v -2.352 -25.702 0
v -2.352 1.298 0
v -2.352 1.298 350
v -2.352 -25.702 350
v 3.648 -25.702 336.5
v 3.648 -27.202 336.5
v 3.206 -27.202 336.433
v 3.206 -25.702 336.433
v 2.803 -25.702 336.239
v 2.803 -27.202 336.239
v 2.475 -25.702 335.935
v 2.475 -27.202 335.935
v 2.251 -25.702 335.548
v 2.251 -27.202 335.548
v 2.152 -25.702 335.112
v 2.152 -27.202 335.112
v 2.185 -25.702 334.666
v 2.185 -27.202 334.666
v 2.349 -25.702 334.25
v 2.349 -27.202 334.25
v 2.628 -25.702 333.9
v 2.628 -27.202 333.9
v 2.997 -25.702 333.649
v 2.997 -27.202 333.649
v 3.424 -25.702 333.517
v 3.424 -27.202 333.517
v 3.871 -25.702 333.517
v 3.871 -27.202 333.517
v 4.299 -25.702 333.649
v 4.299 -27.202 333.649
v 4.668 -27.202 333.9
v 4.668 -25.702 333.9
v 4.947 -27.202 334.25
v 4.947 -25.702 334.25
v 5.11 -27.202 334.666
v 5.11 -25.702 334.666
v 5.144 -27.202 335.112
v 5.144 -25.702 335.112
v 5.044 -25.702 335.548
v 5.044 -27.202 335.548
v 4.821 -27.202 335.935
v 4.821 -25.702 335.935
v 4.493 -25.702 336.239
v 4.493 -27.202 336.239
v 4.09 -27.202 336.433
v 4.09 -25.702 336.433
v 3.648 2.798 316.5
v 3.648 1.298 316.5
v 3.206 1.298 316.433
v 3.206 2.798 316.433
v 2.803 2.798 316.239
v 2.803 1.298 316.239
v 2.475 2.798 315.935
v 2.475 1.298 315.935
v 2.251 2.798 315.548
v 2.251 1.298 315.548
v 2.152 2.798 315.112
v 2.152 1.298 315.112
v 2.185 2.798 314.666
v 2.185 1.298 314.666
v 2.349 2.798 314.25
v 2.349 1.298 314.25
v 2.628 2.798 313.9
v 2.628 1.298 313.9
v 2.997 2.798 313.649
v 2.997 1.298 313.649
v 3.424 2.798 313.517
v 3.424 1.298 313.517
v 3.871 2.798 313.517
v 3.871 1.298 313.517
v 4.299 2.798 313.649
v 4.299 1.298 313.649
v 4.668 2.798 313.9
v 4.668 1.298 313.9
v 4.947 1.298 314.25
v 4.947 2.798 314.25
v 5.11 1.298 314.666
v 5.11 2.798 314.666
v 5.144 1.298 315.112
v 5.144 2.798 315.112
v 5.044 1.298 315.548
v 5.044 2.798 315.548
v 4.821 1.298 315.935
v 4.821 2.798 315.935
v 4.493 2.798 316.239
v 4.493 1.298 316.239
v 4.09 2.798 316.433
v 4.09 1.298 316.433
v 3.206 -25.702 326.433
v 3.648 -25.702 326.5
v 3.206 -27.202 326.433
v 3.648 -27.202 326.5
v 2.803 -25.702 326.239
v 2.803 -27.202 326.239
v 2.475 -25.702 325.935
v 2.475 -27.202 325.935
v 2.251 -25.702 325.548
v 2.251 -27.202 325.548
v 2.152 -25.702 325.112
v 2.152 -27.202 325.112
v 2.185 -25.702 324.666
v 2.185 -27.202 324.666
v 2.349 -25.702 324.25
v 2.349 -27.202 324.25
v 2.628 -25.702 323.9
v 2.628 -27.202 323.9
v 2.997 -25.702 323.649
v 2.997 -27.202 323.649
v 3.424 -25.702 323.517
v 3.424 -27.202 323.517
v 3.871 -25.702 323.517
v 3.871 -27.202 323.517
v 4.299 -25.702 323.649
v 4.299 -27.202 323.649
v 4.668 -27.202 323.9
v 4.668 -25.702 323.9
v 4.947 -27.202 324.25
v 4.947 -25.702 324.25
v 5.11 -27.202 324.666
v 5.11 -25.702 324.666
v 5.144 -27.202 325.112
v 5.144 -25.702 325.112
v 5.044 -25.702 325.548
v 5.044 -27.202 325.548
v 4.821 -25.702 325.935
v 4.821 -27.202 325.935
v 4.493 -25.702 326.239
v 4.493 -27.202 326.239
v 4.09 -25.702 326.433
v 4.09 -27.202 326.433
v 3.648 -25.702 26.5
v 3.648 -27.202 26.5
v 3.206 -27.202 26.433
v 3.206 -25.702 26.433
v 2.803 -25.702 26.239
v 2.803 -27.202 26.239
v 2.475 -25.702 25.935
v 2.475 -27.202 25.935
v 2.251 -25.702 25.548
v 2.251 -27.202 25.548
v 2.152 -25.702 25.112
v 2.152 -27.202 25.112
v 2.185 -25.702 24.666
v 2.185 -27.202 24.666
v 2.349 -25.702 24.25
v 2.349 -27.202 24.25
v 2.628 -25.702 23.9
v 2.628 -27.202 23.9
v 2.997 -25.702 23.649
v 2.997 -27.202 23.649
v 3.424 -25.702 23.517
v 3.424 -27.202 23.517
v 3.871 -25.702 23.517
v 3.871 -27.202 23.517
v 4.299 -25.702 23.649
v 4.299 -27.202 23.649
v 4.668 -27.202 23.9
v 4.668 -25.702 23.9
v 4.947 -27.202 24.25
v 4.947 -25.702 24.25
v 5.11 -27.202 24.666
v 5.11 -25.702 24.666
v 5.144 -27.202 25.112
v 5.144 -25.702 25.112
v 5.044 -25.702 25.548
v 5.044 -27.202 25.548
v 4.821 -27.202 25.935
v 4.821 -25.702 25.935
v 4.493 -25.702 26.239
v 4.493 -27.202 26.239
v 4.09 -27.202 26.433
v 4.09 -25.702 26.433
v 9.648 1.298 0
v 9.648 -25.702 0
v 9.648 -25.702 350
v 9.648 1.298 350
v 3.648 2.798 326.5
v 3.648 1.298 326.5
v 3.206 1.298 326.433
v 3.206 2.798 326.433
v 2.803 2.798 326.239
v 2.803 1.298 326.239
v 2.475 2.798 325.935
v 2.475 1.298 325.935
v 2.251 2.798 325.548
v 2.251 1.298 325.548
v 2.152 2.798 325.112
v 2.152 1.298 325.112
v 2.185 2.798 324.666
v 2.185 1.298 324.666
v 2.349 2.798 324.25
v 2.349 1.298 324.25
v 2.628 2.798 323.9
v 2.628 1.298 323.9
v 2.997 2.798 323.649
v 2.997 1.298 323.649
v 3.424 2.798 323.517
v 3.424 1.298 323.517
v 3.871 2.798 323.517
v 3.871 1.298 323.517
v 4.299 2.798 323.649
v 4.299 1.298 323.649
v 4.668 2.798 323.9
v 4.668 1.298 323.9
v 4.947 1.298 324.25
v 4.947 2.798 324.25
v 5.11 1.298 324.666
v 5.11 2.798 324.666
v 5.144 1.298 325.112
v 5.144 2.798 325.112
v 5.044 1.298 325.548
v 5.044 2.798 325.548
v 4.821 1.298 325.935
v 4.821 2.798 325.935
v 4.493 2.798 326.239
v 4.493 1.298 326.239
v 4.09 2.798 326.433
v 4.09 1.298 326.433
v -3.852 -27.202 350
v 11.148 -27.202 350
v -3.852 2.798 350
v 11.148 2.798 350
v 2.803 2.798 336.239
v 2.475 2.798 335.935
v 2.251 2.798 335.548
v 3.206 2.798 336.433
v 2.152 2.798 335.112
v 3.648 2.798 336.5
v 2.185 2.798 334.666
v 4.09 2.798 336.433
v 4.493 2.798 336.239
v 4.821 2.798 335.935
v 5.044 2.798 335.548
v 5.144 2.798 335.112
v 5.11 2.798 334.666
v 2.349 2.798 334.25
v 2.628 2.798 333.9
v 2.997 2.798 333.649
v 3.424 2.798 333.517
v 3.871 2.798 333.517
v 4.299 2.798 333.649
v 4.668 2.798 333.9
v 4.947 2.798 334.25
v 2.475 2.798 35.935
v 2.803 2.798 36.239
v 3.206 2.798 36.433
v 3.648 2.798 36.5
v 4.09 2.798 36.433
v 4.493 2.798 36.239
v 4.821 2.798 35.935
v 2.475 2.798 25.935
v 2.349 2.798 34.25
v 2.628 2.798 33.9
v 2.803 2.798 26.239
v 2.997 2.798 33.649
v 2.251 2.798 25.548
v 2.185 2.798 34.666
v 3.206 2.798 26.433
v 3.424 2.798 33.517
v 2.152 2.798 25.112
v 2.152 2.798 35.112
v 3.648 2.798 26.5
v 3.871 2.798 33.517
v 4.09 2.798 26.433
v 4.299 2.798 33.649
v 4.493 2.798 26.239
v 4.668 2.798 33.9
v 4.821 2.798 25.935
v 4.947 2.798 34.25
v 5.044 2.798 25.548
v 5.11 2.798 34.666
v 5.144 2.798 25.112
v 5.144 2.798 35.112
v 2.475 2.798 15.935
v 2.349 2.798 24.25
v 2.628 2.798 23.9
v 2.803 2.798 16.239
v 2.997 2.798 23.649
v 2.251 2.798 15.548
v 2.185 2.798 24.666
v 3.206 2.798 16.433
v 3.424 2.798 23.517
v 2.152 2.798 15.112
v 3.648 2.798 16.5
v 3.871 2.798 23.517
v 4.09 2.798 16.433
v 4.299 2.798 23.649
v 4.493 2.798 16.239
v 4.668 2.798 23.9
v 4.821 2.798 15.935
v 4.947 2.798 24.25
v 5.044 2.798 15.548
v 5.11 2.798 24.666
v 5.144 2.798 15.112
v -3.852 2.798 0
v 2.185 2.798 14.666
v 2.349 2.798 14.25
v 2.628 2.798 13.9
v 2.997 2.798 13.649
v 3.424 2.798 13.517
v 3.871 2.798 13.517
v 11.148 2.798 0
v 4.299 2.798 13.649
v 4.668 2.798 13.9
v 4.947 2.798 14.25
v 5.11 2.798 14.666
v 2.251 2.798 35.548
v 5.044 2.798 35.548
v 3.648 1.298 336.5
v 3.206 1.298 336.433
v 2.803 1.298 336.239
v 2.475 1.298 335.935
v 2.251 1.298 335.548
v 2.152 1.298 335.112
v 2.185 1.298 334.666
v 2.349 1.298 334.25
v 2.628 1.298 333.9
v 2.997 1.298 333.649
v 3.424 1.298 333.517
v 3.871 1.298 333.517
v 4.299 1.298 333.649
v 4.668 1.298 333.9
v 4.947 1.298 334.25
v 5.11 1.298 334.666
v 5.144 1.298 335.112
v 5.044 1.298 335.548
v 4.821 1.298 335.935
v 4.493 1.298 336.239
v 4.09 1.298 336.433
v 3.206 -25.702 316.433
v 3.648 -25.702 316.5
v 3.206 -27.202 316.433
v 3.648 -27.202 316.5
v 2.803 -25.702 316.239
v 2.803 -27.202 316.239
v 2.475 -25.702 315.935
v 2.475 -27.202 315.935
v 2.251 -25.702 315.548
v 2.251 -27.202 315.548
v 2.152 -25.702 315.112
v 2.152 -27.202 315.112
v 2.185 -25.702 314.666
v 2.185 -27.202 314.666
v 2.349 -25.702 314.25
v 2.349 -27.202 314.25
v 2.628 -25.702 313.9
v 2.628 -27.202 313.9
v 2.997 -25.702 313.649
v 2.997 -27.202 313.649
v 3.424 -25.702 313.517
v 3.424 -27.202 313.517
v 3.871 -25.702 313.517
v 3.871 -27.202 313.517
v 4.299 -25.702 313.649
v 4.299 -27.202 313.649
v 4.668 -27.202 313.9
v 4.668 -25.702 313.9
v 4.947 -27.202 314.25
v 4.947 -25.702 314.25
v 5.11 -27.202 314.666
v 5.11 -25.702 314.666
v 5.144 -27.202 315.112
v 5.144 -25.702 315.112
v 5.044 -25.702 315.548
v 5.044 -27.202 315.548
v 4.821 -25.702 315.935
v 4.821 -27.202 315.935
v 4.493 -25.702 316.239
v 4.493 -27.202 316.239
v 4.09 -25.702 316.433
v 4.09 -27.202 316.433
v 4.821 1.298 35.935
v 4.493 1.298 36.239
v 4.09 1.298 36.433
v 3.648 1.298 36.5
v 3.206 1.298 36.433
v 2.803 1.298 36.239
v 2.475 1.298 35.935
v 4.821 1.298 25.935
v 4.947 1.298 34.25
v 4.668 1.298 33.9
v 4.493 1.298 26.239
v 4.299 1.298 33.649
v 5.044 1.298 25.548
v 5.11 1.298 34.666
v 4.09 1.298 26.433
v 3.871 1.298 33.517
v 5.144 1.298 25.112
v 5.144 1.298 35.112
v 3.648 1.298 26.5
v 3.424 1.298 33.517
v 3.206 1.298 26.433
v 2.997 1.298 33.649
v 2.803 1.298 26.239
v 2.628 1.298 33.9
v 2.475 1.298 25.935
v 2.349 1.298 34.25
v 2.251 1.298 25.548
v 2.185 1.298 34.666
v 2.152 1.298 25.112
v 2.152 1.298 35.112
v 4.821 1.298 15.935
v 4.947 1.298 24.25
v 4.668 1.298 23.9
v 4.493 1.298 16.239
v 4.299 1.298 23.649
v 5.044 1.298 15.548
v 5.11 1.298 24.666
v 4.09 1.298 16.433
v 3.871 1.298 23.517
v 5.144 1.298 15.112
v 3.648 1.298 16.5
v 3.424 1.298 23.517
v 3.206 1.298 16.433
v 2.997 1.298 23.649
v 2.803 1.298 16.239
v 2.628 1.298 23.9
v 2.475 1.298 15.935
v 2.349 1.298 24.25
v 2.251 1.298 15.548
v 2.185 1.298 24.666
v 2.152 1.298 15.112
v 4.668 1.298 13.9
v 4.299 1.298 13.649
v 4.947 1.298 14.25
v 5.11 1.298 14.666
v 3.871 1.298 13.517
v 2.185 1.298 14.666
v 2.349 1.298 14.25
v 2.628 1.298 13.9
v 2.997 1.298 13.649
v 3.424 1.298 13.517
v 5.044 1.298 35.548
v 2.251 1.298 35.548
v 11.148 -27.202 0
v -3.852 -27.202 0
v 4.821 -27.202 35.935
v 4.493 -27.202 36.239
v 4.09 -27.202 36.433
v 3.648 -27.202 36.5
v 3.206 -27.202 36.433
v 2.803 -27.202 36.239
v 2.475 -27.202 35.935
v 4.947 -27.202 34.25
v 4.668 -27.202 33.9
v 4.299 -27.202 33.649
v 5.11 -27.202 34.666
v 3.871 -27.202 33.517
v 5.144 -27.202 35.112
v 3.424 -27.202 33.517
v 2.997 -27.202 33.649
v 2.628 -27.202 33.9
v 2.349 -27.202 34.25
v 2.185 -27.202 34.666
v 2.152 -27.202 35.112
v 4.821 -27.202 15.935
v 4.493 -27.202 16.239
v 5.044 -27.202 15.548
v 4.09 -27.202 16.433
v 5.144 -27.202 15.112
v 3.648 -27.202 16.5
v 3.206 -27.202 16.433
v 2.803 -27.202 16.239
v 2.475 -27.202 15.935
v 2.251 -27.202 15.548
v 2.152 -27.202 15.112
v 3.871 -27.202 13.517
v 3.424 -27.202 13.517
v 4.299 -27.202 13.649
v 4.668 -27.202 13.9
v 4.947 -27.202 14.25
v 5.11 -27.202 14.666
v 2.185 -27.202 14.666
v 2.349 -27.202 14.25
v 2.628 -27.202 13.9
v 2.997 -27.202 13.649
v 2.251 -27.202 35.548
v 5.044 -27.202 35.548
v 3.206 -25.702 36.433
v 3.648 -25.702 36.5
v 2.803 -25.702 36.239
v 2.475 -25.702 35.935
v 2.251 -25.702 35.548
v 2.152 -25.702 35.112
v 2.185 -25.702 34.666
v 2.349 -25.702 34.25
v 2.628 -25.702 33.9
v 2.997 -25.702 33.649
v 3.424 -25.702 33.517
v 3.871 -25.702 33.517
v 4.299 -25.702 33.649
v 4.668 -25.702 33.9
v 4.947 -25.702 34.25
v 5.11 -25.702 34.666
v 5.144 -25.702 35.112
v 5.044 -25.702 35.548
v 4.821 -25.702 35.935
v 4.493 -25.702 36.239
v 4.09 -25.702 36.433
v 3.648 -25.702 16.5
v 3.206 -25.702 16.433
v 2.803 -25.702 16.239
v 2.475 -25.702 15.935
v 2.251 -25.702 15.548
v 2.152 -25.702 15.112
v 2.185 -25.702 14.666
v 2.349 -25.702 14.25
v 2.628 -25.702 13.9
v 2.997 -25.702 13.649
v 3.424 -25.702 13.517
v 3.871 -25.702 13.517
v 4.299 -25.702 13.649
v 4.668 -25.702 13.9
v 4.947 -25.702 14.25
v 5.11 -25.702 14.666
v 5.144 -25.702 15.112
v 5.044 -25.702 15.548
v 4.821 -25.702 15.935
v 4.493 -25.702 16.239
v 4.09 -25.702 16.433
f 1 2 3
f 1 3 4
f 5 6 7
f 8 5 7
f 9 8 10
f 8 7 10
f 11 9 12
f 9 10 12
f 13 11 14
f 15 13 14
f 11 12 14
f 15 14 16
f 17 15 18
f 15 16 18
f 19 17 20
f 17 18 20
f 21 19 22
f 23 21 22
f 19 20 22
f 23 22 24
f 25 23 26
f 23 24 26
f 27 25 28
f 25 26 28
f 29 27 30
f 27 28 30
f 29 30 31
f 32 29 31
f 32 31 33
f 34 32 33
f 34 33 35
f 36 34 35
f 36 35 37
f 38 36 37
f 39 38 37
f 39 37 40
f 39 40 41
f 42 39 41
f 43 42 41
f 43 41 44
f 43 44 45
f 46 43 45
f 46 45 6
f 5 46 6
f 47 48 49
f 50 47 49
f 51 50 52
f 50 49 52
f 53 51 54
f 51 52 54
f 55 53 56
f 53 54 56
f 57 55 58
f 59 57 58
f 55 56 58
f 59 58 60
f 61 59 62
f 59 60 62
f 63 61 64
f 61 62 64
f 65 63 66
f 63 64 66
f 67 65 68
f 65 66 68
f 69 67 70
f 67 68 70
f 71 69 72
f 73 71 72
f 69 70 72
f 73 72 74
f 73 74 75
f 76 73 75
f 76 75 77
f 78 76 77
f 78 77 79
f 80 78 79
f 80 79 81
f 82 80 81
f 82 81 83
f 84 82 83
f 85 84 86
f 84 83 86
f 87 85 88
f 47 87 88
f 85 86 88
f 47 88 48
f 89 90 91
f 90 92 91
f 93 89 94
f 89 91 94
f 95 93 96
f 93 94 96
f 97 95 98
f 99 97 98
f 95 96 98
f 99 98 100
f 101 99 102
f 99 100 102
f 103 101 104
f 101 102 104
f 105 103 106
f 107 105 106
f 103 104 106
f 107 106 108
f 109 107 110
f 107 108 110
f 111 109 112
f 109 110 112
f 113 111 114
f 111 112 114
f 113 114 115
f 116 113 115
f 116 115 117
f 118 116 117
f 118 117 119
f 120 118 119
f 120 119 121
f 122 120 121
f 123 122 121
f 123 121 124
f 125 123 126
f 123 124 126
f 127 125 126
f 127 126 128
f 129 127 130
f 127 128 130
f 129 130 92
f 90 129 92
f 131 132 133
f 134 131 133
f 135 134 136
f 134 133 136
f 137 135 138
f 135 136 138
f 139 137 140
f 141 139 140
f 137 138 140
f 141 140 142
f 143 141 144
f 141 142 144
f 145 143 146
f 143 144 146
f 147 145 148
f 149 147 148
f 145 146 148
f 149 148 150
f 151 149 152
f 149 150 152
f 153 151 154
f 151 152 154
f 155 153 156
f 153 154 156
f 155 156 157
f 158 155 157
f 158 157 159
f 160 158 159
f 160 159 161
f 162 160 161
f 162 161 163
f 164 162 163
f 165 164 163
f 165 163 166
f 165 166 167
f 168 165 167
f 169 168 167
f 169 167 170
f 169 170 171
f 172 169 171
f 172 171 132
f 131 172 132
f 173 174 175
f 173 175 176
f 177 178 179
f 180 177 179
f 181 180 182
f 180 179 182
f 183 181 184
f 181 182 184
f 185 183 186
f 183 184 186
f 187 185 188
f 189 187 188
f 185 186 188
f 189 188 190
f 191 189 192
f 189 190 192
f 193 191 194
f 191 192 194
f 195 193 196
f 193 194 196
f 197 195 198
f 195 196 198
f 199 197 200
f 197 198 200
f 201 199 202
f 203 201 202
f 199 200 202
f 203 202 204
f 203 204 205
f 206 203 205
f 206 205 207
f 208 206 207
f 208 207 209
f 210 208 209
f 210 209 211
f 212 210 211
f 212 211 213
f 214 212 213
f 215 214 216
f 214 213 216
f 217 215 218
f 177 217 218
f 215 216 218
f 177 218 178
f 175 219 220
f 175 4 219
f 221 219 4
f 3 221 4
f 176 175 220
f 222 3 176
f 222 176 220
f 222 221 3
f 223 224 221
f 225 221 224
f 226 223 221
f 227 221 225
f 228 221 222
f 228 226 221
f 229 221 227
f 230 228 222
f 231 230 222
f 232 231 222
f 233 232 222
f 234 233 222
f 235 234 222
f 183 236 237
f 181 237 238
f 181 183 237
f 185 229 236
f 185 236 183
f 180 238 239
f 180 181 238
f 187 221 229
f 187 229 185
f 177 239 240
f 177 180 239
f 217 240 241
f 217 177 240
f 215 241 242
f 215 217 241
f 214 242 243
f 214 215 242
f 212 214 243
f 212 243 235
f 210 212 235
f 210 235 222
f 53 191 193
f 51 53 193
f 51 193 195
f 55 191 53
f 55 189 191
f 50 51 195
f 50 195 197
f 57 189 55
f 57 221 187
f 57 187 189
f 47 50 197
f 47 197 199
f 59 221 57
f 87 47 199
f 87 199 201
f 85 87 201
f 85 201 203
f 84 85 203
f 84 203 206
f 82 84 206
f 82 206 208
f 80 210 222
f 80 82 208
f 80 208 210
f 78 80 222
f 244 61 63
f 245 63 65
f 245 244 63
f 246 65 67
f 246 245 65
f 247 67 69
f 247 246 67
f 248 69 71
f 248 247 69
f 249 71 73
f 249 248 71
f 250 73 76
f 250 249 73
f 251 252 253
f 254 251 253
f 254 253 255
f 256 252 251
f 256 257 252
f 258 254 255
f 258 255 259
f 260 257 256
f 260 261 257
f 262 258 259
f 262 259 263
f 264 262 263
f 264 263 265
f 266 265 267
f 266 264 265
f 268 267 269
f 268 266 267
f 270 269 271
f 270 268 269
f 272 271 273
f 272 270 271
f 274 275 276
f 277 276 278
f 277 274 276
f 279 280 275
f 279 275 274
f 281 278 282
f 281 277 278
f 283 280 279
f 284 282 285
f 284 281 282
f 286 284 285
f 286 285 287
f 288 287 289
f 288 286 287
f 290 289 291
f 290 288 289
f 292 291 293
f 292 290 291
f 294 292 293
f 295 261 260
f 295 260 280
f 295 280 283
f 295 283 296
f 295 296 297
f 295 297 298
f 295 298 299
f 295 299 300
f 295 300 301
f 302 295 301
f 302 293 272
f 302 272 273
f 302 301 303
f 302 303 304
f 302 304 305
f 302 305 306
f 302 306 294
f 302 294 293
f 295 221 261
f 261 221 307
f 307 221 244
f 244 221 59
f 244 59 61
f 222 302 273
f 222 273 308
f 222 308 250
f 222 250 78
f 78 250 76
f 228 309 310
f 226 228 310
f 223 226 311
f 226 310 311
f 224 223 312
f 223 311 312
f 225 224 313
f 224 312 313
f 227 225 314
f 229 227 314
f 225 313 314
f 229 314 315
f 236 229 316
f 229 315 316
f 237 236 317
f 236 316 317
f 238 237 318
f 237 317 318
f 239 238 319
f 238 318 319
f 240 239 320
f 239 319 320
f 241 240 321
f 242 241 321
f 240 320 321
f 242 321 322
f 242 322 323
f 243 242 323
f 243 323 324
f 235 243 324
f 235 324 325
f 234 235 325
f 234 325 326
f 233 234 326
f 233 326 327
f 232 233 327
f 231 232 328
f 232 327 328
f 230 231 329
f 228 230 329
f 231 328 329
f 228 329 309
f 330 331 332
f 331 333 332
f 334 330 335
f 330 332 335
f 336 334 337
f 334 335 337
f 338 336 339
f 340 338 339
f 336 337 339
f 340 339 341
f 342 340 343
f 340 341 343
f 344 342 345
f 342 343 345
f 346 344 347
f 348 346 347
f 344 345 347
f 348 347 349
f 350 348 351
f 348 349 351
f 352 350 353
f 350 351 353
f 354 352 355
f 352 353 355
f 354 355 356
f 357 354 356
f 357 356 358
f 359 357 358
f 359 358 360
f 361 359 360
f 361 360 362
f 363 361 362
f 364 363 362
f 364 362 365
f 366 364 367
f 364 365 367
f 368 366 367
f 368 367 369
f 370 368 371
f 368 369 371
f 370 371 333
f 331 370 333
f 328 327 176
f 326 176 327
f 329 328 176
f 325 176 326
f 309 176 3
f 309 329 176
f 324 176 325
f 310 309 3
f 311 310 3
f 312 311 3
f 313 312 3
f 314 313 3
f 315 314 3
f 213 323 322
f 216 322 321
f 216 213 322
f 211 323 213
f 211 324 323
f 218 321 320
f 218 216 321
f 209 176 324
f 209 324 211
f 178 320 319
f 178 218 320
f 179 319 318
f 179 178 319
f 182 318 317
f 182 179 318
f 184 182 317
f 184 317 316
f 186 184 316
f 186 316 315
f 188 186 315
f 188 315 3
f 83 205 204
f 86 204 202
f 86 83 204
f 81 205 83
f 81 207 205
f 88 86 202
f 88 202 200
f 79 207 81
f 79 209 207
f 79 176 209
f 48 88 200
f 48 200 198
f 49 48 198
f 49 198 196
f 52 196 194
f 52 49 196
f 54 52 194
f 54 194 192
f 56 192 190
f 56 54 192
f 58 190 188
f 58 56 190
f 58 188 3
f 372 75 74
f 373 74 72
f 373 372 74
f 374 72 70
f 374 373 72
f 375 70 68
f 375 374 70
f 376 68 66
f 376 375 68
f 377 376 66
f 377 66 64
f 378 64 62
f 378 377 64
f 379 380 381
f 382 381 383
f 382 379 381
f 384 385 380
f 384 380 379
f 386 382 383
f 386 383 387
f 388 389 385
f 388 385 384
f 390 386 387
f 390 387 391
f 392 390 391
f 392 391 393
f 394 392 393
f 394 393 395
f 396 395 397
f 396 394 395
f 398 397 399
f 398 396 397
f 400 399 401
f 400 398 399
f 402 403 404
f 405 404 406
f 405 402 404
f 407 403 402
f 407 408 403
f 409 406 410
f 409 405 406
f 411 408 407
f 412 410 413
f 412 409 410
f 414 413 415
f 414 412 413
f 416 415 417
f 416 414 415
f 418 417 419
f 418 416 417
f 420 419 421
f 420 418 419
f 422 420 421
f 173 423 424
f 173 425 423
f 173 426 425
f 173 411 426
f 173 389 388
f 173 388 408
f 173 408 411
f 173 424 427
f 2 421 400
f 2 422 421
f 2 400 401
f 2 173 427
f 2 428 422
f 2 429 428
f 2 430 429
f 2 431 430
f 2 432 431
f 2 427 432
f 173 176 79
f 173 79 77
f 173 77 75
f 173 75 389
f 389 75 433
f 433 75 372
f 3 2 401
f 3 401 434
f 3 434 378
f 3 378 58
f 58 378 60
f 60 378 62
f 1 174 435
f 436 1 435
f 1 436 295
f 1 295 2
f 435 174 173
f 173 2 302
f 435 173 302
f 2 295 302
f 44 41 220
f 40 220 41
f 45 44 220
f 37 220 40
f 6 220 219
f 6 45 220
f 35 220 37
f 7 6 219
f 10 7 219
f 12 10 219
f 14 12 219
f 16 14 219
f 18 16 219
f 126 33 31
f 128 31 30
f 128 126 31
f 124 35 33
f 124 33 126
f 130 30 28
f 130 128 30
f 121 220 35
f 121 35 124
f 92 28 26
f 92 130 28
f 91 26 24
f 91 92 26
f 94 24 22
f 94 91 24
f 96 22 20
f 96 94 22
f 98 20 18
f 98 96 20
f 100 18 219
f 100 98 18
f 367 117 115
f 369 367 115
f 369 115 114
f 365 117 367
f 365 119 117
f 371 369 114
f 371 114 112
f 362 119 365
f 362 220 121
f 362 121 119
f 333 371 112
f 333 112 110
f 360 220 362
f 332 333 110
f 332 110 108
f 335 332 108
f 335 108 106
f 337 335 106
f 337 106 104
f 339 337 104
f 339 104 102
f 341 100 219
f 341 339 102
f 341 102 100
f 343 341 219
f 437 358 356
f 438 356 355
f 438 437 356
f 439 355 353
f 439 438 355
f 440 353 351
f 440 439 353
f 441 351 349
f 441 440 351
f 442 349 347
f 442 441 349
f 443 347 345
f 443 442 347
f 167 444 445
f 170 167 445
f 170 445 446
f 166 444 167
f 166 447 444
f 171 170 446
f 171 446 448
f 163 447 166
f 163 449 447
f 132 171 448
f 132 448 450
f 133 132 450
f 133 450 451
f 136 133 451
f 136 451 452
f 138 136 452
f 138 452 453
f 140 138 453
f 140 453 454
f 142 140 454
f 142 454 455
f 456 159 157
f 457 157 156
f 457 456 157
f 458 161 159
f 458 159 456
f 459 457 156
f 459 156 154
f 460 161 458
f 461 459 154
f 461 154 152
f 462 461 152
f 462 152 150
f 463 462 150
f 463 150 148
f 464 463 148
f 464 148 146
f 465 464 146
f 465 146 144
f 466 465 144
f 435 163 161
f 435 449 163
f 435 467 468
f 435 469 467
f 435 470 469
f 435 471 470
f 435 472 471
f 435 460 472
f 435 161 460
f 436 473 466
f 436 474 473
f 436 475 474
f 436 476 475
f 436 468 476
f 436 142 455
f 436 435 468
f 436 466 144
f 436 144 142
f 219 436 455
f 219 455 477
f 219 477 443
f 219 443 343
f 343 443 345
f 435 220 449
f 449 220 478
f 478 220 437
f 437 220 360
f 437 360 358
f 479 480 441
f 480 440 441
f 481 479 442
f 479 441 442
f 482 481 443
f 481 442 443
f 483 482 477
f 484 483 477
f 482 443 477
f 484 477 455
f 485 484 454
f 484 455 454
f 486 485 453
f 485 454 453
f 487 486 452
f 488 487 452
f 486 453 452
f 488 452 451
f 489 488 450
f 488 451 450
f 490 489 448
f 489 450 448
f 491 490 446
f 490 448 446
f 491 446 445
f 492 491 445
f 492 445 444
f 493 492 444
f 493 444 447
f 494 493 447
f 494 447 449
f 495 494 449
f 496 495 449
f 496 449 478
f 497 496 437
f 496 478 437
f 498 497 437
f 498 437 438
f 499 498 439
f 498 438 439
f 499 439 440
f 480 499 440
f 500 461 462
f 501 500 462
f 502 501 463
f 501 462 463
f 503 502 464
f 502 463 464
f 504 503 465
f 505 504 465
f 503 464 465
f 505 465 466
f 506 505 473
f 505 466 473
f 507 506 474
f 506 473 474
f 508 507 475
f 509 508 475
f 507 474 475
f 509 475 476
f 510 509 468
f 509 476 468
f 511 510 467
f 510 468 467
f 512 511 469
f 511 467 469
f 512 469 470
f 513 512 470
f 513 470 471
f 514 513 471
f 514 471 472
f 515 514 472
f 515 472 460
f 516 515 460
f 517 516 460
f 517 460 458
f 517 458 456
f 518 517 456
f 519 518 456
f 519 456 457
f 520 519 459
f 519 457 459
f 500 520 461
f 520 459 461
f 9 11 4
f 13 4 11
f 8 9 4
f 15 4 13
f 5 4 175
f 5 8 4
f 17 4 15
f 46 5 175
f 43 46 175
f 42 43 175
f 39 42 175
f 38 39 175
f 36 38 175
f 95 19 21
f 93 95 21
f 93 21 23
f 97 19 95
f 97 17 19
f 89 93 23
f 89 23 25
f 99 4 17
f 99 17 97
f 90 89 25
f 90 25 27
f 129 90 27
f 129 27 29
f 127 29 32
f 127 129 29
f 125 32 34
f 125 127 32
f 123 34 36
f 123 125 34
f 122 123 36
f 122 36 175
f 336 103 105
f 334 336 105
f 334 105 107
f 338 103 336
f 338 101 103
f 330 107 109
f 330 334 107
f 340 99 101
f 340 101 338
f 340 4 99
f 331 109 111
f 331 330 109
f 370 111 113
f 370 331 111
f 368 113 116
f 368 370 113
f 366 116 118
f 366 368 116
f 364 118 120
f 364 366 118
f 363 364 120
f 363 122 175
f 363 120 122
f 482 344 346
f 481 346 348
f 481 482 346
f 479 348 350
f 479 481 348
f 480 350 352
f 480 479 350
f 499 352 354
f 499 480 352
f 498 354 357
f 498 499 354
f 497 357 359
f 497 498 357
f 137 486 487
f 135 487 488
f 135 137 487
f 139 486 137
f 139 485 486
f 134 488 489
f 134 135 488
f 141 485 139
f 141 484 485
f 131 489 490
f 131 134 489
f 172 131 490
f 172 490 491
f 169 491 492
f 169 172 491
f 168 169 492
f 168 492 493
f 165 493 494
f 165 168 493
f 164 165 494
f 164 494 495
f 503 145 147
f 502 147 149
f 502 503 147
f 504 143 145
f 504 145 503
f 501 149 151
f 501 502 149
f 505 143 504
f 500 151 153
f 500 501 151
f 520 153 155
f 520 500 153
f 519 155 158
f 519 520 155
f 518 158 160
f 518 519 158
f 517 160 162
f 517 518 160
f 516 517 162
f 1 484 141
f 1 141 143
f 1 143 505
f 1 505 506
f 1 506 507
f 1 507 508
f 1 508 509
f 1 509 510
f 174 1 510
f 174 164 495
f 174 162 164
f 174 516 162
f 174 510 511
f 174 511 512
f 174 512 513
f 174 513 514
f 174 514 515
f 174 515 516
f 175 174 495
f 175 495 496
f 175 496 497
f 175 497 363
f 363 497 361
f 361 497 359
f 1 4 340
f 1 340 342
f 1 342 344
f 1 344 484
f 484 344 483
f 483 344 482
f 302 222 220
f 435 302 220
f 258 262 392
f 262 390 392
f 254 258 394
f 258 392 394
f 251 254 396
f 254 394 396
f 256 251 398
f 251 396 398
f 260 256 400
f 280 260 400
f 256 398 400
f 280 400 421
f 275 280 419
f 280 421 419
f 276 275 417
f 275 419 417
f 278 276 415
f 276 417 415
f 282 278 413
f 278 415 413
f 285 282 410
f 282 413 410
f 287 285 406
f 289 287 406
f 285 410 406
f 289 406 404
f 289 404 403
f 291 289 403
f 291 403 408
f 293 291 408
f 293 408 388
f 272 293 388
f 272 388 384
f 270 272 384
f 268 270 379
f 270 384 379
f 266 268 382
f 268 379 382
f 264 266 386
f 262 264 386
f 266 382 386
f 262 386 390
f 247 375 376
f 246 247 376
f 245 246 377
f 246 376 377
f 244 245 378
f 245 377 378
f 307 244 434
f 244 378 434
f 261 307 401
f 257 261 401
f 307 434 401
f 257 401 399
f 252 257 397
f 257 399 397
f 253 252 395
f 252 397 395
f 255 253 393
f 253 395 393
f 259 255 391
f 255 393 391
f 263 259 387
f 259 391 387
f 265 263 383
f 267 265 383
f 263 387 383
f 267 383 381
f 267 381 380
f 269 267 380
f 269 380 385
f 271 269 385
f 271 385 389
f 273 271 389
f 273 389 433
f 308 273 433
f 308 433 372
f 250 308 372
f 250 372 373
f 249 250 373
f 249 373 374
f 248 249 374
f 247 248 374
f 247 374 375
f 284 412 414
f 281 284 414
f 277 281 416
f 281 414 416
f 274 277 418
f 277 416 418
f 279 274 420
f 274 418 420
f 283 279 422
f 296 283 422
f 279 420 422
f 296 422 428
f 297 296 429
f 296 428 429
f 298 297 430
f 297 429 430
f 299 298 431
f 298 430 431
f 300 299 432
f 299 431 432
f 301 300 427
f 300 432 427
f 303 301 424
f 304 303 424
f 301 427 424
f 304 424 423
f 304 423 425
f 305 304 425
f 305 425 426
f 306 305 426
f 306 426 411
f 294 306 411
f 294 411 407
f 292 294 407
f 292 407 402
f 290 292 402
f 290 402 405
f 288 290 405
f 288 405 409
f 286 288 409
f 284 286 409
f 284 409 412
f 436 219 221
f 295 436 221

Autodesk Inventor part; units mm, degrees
ref_plane "YZ Plane" through (0, 0, 0) normal (1, 0, 0) x (0, 1, 0)
ref_plane "XZ Plane" through (0, 0, 0) normal (0, 1, 0) x (-1, 0, 0)
ref_plane "XY Plane" through (0, 0, 0) normal (0, 0, 1) x (1, 0, 0)
sketch "スケッチ1" plane through (0, 0, 0) normal (0, 0, 1) x (1, 0, 0)
  line L0 (-3.8522, 2.7979) -> (11.1478, 2.7979)
  line L1 (11.1478, 2.7979) -> (11.1478, -27.2021)
  line L2 (11.1478, -27.2021) -> (-3.8522, -27.2021)
  line L3 (-3.8522, -27.2021) -> (-3.8522, 2.7979)
  point P0 (0, 0)
  dimension "d0" = 15
  dimension "d1" = 30
extrude "押し出し1" add sketch "スケッチ1" along normal blind 350
sketch "スケッチ2" plane through (-3.8522, 2.7979, 0) normal (0, 1, 0) x (1, 0, 0)
  circle A0 centre (7.5, -335) radius 1.5
  line L0 (15, -350) -> (0, -350) projected
  circle A1 centre (7.5, -325) radius 1.5
  circle A2 centre (7.5, -315) radius 1.5
  line L1 (0, 0) -> (0, -350) projected
  line L2 (15, 0) -> (15, -350) projected
  circle A3 centre (7.5, -15) radius 1.5
  line L3 (0, 0) -> (15, 0) projected
  circle A4 centre (7.5, -25) radius 1.5
  circle A5 centre (7.5, -35) radius 1.5
  point P0 (3.8522, 0)
  dimension "d4" = 3
  dimension "d5" = 15
  dimension "d6" = 3
  dimension "d7" = 3
  dimension "d8" = 10
  dimension "d9" = 10
  dimension "d10" = 7.5
  dimension "d11" = 7.5
  dimension "d12" = 7.5
  dimension "d13" = 3
  dimension "d14" = 15
  dimension "d15" = 7.5
  dimension "d16" = 3
  dimension "d17" = 3
  dimension "d18" = 10
  dimension "d19" = 10
hole "穴1" at (3.6478, 2.7979, 335) at (3.6478, 2.7979, 325) at (3.6478, 2.7979, 315) at (3.6478, 2.7979, 35) at (3.6478, 2.7979, 25) at (3.6478, 2.7979, 15) direction (0, -1, 0) diameter 3 depth 30
sketch "スケッチ3" plane through (0, 0, 0) normal (0, 0, -1) x (-1, 0, 0)
  line L0 (-9.6478, 1.2979) -> (2.3522, 1.2979)
  line L1 (2.3522, 1.2979) -> (2.3522, -25.7021)
  line L2 (2.3522, -25.7021) -> (-9.6478, -25.7021)
  line L3 (-9.6478, -25.7021) -> (-9.6478, 1.2979)
  line L4 (3.8522, 2.7979) -> (-11.1478, 2.7979) projected
  line L5 (-11.1478, 2.7979) -> (-11.1478, -27.2021) projected
  point P0 (0, 0)
  dimension "d27" = 12
  dimension "d28" = 27
  dimension "d29" = 1.5
  dimension "d30" = 1.5
extrude "押し出し2" cut sketch "スケッチ3" against normal blind 350
sketch "スケッチ4" plane through (-3.8522, 2.7979, 0) normal (0, 1, 0) x (1, 0, 0)
  point P0 (3.8522, 0)
properties part number "nhk9" material "アルミニウム 6061"
